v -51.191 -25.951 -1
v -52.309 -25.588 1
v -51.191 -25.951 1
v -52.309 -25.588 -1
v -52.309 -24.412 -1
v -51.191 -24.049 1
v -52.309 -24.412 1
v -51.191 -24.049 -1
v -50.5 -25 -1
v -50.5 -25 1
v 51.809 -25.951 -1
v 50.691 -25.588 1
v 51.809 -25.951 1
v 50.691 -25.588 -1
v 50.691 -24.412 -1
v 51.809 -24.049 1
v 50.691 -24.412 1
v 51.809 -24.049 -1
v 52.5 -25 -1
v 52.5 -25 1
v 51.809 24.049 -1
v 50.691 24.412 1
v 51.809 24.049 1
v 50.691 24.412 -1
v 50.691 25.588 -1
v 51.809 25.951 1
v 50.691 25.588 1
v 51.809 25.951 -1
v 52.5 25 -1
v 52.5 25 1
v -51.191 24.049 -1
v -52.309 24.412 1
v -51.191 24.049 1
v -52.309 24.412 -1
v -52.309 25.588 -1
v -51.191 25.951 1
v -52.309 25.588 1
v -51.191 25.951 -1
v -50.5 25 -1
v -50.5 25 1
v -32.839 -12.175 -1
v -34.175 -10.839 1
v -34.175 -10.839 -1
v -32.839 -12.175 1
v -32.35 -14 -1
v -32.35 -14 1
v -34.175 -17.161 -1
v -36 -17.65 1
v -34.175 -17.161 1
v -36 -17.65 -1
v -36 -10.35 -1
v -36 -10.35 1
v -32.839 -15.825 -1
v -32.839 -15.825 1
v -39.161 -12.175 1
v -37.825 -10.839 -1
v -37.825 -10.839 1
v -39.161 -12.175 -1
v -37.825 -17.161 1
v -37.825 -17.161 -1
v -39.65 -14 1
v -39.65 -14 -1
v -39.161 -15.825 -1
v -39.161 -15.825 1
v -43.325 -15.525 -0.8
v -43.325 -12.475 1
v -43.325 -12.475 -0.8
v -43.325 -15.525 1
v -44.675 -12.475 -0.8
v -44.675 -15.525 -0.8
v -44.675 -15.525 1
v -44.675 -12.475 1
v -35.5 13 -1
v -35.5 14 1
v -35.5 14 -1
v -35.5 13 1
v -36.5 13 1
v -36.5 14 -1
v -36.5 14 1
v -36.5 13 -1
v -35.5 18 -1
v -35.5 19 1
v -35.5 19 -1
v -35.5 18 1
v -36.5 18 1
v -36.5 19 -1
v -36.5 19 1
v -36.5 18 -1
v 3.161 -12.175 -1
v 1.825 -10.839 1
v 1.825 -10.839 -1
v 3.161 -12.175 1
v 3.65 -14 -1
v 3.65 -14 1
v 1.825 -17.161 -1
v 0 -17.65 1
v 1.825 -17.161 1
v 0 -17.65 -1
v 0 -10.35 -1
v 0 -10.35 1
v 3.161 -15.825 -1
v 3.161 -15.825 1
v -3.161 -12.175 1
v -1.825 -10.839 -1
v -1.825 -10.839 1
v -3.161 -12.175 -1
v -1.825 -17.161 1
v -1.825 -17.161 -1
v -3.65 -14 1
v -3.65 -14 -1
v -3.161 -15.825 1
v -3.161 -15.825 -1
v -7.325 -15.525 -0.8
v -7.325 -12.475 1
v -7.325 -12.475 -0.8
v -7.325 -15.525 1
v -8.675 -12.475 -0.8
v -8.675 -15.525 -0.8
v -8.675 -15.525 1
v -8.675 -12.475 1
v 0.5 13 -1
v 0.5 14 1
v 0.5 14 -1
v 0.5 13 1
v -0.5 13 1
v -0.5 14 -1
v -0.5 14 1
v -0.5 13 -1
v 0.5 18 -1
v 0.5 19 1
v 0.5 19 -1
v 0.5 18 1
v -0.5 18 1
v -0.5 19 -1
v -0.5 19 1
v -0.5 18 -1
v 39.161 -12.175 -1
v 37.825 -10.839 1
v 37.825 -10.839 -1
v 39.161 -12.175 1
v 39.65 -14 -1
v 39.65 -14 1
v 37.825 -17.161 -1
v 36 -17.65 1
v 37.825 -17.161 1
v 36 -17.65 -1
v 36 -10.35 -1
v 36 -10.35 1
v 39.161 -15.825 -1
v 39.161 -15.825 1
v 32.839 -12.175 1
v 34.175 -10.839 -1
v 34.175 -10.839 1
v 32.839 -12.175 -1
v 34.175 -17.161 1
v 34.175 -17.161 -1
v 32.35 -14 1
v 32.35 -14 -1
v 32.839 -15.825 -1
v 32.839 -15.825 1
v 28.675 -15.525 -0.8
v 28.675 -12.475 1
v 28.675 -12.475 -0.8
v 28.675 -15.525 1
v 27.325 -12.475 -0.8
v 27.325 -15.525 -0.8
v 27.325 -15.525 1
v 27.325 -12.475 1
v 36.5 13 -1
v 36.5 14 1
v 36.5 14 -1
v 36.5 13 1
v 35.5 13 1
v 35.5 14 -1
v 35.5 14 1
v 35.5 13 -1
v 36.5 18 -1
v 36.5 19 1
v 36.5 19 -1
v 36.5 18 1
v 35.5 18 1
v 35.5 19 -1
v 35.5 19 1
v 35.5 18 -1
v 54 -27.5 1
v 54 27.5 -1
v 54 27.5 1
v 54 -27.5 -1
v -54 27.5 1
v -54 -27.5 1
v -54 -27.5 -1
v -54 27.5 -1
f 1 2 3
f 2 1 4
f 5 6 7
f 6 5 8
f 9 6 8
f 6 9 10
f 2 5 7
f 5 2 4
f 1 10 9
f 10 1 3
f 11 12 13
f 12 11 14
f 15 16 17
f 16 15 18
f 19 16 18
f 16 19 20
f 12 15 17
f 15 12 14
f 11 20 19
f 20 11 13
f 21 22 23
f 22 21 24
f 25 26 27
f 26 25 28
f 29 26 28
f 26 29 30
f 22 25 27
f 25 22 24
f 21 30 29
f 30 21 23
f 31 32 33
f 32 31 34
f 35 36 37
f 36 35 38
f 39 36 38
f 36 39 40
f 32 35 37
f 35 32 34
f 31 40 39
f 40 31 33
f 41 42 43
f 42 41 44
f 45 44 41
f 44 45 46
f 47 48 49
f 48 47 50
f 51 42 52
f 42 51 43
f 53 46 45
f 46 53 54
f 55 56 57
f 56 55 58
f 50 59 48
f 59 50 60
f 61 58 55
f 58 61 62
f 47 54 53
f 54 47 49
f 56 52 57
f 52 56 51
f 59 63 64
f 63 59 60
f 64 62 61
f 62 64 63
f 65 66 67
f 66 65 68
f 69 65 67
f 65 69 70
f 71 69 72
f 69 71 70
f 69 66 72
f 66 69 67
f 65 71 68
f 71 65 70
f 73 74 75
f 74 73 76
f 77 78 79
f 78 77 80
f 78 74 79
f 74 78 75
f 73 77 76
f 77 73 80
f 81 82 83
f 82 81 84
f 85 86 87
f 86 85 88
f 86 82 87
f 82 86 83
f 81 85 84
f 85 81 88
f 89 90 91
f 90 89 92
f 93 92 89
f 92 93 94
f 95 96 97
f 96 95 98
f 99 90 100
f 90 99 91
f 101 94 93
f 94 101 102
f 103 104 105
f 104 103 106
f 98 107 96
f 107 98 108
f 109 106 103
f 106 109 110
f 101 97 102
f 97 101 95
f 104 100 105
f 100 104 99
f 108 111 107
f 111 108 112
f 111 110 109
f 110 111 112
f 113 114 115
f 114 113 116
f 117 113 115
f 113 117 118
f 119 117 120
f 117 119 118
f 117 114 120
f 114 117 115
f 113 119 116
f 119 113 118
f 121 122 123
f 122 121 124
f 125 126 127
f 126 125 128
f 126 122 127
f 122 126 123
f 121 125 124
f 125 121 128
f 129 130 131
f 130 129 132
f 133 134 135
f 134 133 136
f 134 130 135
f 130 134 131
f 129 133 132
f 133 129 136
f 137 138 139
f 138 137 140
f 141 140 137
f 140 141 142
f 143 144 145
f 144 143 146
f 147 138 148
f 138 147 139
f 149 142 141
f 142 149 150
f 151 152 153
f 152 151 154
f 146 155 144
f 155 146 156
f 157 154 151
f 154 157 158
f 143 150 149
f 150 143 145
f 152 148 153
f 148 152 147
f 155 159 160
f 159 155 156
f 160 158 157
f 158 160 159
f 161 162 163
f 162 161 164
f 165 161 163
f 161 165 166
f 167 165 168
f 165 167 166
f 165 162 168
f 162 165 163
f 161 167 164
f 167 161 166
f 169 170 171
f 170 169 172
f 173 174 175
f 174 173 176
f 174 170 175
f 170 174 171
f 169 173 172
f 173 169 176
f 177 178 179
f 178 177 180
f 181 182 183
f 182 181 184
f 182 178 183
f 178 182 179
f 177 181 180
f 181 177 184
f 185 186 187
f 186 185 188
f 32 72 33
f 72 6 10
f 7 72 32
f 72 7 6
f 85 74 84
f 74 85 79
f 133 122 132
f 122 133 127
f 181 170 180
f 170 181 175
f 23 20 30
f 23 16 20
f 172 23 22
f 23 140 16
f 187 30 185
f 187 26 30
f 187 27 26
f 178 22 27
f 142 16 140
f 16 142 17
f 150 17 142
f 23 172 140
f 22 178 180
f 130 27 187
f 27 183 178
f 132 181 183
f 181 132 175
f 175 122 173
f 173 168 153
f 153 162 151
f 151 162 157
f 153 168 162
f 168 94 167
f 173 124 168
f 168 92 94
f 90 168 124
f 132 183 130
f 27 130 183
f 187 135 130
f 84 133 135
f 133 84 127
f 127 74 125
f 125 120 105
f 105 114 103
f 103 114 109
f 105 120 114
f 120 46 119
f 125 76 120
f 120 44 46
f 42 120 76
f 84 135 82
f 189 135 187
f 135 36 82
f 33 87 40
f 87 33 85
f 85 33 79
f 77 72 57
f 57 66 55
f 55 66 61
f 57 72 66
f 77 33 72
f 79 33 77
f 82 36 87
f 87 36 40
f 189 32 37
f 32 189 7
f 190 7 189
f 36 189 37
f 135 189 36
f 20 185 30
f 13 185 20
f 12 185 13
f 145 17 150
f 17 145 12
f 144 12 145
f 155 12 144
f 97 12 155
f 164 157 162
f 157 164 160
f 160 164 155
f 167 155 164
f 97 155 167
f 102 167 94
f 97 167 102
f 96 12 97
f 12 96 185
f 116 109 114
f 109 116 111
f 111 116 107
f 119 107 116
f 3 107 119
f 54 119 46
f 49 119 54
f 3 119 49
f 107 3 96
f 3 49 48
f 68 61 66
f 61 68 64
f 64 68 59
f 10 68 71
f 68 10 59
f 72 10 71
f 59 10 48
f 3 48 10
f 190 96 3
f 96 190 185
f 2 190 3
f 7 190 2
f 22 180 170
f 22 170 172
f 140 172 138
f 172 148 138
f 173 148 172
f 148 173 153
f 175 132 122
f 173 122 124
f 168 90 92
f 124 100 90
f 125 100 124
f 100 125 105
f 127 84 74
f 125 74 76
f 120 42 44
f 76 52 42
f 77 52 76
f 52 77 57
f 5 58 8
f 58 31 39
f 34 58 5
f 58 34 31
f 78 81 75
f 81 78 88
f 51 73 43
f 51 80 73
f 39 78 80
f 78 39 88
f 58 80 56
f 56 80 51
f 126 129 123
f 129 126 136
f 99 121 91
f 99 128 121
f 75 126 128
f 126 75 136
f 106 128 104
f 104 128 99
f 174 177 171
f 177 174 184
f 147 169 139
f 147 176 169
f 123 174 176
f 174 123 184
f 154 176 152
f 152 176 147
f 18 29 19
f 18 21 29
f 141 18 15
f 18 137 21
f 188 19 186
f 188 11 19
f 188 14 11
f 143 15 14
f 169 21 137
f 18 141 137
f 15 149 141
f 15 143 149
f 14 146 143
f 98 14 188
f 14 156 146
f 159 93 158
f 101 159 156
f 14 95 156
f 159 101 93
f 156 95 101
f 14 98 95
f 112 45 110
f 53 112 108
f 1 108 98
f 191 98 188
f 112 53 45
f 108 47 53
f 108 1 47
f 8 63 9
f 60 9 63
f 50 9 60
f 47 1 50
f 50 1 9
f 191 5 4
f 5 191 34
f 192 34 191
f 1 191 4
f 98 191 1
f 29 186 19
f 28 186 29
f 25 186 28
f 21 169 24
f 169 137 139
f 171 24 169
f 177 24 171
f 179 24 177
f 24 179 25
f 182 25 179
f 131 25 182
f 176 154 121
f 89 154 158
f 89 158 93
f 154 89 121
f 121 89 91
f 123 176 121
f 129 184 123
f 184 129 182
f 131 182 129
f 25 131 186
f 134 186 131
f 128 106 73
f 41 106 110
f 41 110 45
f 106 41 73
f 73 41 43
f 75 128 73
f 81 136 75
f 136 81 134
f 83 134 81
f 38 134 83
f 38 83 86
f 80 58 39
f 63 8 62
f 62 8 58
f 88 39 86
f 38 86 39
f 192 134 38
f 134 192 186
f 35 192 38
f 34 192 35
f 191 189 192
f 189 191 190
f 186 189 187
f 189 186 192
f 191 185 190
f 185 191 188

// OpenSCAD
/*

cd /Users/d/Desktop/3dprint/ImplicitCad/
~/.cabal/bin/extopenscad soundslicer.scad

*/

$res=0.3;

module pot() {
	cylinder(r=3.65, h=5, center = true);
	translate([-8, 0, 0.2])
	cube(size = [1.35, 3.05, 2], center = true);
}

module push() {
	translate([0, -2.5, 0])
	cube(size = [1, 1, 8], center = true);
	translate([0, 2.5, 0])
	cube(size = [1, 1, 8], center = true);
}

alturaPot = -14;
alturaPush = 16;
w = 36*3;
h = 55;
margem = 2.5;

module holes() {
mw = w*0.5 - margem;
mh = h*0.5 - margem;
        translate([-mw, -mh, 0])
    cylinder(r=1, h=5, center = true);
    translate([mw, -mh, 0])
    cylinder(r=1, h=5, center = true);
    translate([mw, mh, 0])
    cylinder(r=1, h=5, center = true);
    translate([-mw, mh, 0])
    cylinder(r=1, h=5, center = true);
}



difference(){
//	cube(size = [w, h, 2], center = true, r=[1,0,0]);
	cube(size = [w, h, 2], center = true, r=1);
    
    holes();

    
	translate([-36, alturaPot, 0])
	pot();
	translate([-36, alturaPush, 0])
	push();

	translate([0, alturaPot, 0])
	pot();
	translate([0, alturaPush, 0])
	push();

	translate([36, alturaPot, 0])
	pot();
	translate([36, alturaPush, 0])
	push();
}
